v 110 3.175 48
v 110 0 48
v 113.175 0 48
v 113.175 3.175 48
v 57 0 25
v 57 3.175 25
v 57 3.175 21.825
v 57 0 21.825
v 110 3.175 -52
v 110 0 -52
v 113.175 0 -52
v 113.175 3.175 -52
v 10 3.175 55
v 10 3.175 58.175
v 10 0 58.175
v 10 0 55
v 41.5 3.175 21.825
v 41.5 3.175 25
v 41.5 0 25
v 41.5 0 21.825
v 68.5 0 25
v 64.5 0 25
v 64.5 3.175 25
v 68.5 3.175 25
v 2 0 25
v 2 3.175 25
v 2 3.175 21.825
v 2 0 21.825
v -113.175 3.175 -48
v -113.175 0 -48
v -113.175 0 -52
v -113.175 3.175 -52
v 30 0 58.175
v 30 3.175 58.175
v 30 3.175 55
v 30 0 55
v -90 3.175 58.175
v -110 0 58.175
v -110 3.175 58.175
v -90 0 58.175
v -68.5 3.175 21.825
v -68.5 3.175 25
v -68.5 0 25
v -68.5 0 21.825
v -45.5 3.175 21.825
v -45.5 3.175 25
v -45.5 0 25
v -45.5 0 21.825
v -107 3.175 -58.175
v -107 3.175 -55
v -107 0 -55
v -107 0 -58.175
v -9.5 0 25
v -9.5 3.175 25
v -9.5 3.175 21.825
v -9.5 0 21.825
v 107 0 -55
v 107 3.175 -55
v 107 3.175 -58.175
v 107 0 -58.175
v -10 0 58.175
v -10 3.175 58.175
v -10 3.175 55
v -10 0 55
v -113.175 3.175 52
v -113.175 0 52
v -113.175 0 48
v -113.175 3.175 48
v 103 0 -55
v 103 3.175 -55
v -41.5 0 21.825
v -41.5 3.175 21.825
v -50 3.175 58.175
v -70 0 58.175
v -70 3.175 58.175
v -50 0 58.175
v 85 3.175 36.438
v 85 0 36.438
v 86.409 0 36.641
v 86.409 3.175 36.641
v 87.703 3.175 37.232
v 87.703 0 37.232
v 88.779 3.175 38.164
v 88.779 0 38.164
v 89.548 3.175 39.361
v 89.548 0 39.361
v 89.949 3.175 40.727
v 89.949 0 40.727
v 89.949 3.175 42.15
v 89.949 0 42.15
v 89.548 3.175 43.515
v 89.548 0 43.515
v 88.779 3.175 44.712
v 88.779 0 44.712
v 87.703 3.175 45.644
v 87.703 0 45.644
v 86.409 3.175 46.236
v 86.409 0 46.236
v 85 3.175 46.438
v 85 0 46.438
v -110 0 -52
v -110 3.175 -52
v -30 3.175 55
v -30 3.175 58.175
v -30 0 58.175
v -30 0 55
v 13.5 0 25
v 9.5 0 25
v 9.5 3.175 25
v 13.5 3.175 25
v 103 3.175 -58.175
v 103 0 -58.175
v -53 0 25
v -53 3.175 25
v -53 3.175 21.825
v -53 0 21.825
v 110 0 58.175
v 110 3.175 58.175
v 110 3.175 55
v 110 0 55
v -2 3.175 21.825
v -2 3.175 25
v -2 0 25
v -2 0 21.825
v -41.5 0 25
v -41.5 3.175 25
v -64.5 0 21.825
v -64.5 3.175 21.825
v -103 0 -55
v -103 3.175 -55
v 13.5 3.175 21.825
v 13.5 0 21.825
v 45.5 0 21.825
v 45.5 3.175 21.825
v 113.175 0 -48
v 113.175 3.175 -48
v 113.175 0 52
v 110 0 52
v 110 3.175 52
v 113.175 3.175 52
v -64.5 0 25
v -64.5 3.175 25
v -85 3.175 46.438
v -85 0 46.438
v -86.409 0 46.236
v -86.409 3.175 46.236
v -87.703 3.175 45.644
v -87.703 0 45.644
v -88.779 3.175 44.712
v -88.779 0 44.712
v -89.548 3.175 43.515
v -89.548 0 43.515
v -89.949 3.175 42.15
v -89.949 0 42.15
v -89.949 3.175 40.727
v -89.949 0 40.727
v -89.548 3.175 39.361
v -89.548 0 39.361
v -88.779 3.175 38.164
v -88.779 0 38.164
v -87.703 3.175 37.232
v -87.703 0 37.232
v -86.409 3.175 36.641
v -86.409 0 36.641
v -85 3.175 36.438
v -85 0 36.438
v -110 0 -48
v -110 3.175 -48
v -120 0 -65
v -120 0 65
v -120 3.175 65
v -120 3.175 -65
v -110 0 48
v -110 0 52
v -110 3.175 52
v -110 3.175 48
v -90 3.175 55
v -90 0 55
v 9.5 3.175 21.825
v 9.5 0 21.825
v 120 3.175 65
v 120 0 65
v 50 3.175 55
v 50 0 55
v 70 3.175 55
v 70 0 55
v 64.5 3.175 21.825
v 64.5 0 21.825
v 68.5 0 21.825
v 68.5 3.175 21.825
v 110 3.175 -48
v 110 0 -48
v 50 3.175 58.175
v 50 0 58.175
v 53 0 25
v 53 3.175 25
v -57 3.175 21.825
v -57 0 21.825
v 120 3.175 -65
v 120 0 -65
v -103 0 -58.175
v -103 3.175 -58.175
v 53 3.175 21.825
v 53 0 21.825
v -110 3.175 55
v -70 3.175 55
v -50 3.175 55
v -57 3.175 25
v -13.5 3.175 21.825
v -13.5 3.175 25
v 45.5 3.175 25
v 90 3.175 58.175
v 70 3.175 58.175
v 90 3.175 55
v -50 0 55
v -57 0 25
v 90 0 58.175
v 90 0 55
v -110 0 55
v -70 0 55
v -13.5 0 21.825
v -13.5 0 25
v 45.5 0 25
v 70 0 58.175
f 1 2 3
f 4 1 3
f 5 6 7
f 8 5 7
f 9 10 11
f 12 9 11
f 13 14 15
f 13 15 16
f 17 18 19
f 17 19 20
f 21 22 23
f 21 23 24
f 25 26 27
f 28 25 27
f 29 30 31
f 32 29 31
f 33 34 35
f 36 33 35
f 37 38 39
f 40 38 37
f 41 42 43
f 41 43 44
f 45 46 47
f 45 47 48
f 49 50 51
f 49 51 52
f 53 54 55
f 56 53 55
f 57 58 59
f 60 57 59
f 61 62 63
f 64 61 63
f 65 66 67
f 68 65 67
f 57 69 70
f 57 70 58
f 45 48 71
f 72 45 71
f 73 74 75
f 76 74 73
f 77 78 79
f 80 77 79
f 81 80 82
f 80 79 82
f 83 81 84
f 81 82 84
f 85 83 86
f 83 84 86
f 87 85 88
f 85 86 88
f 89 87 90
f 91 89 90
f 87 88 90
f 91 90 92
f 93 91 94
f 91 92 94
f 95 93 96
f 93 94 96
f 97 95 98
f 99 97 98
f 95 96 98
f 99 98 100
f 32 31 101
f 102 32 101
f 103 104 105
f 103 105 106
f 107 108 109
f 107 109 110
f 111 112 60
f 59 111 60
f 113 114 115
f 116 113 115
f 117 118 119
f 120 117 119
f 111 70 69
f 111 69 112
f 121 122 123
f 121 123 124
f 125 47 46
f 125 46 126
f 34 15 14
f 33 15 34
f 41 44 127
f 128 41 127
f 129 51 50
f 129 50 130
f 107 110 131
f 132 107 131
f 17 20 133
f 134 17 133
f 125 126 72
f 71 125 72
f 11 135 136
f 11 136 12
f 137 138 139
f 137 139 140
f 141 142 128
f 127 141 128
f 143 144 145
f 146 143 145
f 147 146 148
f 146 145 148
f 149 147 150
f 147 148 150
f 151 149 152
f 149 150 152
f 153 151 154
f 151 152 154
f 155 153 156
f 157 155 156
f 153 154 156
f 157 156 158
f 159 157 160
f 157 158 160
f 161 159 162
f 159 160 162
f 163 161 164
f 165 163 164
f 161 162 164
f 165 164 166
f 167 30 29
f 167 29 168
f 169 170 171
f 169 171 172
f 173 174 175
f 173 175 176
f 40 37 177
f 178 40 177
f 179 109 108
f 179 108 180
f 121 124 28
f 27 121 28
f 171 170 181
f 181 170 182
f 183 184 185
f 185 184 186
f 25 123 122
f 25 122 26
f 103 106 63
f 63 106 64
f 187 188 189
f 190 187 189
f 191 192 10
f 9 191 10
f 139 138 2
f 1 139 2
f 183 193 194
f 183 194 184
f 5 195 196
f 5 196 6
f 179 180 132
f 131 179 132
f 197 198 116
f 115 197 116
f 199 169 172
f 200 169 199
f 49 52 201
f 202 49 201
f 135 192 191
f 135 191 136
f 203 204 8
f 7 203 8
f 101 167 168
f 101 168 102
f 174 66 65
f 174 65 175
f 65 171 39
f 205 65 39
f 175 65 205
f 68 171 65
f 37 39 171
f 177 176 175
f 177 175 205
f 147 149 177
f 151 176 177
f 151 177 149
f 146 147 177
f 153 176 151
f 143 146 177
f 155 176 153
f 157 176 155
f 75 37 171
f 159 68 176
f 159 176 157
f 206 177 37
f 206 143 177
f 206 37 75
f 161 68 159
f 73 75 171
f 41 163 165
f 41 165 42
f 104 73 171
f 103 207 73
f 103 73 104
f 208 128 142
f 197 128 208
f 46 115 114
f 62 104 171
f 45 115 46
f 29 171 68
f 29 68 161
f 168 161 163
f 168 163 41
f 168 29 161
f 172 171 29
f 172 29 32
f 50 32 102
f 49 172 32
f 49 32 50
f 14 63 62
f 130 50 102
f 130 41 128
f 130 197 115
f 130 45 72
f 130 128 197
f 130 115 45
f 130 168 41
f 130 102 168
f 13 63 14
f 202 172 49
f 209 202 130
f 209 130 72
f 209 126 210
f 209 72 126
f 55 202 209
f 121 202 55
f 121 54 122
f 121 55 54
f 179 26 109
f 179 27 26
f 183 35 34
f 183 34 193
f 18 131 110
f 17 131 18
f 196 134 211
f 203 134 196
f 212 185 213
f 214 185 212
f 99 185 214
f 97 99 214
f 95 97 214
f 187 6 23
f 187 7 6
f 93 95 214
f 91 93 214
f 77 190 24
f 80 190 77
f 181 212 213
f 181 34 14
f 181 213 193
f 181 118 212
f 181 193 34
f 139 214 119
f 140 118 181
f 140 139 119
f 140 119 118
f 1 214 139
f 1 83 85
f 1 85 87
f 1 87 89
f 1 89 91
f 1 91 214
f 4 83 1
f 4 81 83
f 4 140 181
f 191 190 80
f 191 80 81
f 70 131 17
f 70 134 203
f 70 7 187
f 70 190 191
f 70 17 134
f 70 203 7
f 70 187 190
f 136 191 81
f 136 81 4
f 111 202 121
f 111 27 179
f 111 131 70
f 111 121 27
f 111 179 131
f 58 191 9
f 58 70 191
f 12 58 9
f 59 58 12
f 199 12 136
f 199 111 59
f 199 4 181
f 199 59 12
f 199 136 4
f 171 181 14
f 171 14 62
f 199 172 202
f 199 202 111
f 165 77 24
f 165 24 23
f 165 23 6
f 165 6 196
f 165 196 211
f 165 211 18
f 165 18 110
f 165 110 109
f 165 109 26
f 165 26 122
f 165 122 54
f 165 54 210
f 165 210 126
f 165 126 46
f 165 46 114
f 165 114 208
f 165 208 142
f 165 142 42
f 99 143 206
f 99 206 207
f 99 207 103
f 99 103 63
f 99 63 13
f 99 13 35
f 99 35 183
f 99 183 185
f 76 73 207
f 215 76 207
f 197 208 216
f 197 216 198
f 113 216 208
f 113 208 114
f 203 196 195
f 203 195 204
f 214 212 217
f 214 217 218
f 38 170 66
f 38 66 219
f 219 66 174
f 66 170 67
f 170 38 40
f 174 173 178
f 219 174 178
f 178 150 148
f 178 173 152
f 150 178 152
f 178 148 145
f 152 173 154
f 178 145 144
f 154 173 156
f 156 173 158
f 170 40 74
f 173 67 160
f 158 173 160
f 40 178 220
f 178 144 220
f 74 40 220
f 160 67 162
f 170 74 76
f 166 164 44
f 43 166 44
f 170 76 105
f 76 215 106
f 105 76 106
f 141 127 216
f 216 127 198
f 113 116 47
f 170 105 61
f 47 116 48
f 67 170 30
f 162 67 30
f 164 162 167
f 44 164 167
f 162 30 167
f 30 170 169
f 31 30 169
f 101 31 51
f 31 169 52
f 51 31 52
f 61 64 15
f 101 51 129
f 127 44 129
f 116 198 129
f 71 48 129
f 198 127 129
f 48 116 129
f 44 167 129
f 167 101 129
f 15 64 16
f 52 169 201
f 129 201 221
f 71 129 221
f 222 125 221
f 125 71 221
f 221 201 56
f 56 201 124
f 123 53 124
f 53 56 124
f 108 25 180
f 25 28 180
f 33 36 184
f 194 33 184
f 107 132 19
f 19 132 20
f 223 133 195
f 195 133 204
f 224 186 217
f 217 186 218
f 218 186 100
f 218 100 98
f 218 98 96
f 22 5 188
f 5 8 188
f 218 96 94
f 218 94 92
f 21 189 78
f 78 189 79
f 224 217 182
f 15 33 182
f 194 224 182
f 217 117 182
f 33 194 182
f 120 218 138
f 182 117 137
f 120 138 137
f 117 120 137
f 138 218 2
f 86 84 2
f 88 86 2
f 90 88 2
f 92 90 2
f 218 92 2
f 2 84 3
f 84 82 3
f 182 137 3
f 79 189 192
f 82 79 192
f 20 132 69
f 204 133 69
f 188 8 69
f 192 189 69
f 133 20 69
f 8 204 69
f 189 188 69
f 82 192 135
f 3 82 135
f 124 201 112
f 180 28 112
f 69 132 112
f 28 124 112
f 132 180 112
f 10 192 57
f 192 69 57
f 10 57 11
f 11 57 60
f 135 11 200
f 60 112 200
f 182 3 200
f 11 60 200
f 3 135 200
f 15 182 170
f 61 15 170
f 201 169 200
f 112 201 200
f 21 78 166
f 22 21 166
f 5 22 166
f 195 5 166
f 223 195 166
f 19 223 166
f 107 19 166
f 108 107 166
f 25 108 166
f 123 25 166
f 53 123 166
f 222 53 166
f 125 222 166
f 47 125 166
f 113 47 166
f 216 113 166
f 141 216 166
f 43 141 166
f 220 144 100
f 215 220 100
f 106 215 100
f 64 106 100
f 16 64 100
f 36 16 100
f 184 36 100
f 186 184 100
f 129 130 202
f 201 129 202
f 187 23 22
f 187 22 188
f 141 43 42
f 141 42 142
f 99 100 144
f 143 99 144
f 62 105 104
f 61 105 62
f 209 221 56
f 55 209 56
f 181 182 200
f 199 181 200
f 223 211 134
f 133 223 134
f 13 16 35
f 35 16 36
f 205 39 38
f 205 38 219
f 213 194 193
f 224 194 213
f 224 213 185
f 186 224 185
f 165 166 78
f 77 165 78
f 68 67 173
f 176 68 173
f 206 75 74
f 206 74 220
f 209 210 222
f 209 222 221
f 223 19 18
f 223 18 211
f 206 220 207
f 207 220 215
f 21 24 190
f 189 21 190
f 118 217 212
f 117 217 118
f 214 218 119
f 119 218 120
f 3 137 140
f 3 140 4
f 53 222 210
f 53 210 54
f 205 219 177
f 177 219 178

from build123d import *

# Parameters (mm, degrees)
SKETCH1_W           = 240
SKETCH1_H           = 130
SKETCH1_W_2         = 3.175
SKETCH1_H_2         = 4
SKETCH1_W_3         = 4
SKETCH1_H_3         = 3.175
SKETCH1_W_4         = 20
BOSS_EXTRUDE4_DEPTH = 3.175


with BuildPart() as part:
    # Sketch1 → Boss-Extrude4 (new body)
    with BuildSketch(Plane(origin=(0, 0, 0), x_dir=(1, 0, 0), z_dir=(0, 1, 0))):
        Rectangle(SKETCH1_W, SKETCH1_H)
        with Locations((-111.5875, 50)):
            Rectangle(SKETCH1_W_2, SKETCH1_H_2, mode=Mode.SUBTRACT)
        with Locations((-105, 56.5875)):
            Rectangle(SKETCH1_W_3, SKETCH1_H_3, mode=Mode.SUBTRACT)
        with Locations((105, 56.5875)):
            Rectangle(SKETCH1_W_3, SKETCH1_H_3, mode=Mode.SUBTRACT)
        with Locations((111.5875, 50)):
            Rectangle(SKETCH1_W_2, SKETCH1_H_2, mode=Mode.SUBTRACT)
        with Locations((-111.5875, -50)):
            Rectangle(SKETCH1_W_2, SKETCH1_H_2, mode=Mode.SUBTRACT)
        with Locations((-60, -56.5875)):
            Rectangle(SKETCH1_W_4, SKETCH1_H_3, mode=Mode.SUBTRACT)
        with Locations((111.5875, -50)):
            Rectangle(SKETCH1_W_2, SKETCH1_H_2, mode=Mode.SUBTRACT)
        with Locations((-100, -56.5875)):
            Rectangle(SKETCH1_W_4, SKETCH1_H_3, mode=Mode.SUBTRACT)
        with Locations((-20, -56.5875)):
            Rectangle(SKETCH1_W_4, SKETCH1_H_3, mode=Mode.SUBTRACT)
        with Locations((20, -56.5875)):
            Rectangle(SKETCH1_W_4, SKETCH1_H_3, mode=Mode.SUBTRACT)
        with Locations((60, -56.5875)):
            Rectangle(SKETCH1_W_4, SKETCH1_H_3, mode=Mode.SUBTRACT)
        with Locations((100, -56.5875)):
            Rectangle(SKETCH1_W_4, SKETCH1_H_3, mode=Mode.SUBTRACT)
        with Locations((-66.5, -23.4125)):
            Rectangle(SKETCH1_W_3, SKETCH1_H_3, mode=Mode.SUBTRACT)
        with Locations((-55, -23.4125)):
            Rectangle(SKETCH1_W_3, SKETCH1_H_3, mode=Mode.SUBTRACT)
        with Locations((-43.5, -23.4125)):
            Rectangle(SKETCH1_W_3, SKETCH1_H_3, mode=Mode.SUBTRACT)
        with Locations((43.5, -23.4125)):
            Rectangle(SKETCH1_W_3, SKETCH1_H_3, mode=Mode.SUBTRACT)
        with Locations((55, -23.4125)):
            Rectangle(SKETCH1_W_3, SKETCH1_H_3, mode=Mode.SUBTRACT)
        with Locations((66.5, -23.4125)):
            Rectangle(SKETCH1_W_3, SKETCH1_H_3, mode=Mode.SUBTRACT)
        with Locations((-11.5, -23.4125)):
            Rectangle(SKETCH1_W_3, SKETCH1_H_3, mode=Mode.SUBTRACT)
        with Locations((0, -23.4125)):
            Rectangle(SKETCH1_W_3, SKETCH1_H_3, mode=Mode.SUBTRACT)
        with Locations((11.5, -23.4125)):
            Rectangle(SKETCH1_W_3, SKETCH1_H_3, mode=Mode.SUBTRACT)
        with BuildLine():
            Line((-85, -36.438117734), (85, -36.438117734))
            ThreePointArc((85, -36.438117734), (90, -41.438117734), (85, -46.438117734))
            Line((85, -46.438117734), (-85, -46.438117734))
            ThreePointArc((-85, -46.438117734), (-90, -41.438117734), (-85, -36.438117734))
        make_face(mode=Mode.SUBTRACT)
    extrude(amount=BOSS_EXTRUDE4_DEPTH)


solid = part.part
